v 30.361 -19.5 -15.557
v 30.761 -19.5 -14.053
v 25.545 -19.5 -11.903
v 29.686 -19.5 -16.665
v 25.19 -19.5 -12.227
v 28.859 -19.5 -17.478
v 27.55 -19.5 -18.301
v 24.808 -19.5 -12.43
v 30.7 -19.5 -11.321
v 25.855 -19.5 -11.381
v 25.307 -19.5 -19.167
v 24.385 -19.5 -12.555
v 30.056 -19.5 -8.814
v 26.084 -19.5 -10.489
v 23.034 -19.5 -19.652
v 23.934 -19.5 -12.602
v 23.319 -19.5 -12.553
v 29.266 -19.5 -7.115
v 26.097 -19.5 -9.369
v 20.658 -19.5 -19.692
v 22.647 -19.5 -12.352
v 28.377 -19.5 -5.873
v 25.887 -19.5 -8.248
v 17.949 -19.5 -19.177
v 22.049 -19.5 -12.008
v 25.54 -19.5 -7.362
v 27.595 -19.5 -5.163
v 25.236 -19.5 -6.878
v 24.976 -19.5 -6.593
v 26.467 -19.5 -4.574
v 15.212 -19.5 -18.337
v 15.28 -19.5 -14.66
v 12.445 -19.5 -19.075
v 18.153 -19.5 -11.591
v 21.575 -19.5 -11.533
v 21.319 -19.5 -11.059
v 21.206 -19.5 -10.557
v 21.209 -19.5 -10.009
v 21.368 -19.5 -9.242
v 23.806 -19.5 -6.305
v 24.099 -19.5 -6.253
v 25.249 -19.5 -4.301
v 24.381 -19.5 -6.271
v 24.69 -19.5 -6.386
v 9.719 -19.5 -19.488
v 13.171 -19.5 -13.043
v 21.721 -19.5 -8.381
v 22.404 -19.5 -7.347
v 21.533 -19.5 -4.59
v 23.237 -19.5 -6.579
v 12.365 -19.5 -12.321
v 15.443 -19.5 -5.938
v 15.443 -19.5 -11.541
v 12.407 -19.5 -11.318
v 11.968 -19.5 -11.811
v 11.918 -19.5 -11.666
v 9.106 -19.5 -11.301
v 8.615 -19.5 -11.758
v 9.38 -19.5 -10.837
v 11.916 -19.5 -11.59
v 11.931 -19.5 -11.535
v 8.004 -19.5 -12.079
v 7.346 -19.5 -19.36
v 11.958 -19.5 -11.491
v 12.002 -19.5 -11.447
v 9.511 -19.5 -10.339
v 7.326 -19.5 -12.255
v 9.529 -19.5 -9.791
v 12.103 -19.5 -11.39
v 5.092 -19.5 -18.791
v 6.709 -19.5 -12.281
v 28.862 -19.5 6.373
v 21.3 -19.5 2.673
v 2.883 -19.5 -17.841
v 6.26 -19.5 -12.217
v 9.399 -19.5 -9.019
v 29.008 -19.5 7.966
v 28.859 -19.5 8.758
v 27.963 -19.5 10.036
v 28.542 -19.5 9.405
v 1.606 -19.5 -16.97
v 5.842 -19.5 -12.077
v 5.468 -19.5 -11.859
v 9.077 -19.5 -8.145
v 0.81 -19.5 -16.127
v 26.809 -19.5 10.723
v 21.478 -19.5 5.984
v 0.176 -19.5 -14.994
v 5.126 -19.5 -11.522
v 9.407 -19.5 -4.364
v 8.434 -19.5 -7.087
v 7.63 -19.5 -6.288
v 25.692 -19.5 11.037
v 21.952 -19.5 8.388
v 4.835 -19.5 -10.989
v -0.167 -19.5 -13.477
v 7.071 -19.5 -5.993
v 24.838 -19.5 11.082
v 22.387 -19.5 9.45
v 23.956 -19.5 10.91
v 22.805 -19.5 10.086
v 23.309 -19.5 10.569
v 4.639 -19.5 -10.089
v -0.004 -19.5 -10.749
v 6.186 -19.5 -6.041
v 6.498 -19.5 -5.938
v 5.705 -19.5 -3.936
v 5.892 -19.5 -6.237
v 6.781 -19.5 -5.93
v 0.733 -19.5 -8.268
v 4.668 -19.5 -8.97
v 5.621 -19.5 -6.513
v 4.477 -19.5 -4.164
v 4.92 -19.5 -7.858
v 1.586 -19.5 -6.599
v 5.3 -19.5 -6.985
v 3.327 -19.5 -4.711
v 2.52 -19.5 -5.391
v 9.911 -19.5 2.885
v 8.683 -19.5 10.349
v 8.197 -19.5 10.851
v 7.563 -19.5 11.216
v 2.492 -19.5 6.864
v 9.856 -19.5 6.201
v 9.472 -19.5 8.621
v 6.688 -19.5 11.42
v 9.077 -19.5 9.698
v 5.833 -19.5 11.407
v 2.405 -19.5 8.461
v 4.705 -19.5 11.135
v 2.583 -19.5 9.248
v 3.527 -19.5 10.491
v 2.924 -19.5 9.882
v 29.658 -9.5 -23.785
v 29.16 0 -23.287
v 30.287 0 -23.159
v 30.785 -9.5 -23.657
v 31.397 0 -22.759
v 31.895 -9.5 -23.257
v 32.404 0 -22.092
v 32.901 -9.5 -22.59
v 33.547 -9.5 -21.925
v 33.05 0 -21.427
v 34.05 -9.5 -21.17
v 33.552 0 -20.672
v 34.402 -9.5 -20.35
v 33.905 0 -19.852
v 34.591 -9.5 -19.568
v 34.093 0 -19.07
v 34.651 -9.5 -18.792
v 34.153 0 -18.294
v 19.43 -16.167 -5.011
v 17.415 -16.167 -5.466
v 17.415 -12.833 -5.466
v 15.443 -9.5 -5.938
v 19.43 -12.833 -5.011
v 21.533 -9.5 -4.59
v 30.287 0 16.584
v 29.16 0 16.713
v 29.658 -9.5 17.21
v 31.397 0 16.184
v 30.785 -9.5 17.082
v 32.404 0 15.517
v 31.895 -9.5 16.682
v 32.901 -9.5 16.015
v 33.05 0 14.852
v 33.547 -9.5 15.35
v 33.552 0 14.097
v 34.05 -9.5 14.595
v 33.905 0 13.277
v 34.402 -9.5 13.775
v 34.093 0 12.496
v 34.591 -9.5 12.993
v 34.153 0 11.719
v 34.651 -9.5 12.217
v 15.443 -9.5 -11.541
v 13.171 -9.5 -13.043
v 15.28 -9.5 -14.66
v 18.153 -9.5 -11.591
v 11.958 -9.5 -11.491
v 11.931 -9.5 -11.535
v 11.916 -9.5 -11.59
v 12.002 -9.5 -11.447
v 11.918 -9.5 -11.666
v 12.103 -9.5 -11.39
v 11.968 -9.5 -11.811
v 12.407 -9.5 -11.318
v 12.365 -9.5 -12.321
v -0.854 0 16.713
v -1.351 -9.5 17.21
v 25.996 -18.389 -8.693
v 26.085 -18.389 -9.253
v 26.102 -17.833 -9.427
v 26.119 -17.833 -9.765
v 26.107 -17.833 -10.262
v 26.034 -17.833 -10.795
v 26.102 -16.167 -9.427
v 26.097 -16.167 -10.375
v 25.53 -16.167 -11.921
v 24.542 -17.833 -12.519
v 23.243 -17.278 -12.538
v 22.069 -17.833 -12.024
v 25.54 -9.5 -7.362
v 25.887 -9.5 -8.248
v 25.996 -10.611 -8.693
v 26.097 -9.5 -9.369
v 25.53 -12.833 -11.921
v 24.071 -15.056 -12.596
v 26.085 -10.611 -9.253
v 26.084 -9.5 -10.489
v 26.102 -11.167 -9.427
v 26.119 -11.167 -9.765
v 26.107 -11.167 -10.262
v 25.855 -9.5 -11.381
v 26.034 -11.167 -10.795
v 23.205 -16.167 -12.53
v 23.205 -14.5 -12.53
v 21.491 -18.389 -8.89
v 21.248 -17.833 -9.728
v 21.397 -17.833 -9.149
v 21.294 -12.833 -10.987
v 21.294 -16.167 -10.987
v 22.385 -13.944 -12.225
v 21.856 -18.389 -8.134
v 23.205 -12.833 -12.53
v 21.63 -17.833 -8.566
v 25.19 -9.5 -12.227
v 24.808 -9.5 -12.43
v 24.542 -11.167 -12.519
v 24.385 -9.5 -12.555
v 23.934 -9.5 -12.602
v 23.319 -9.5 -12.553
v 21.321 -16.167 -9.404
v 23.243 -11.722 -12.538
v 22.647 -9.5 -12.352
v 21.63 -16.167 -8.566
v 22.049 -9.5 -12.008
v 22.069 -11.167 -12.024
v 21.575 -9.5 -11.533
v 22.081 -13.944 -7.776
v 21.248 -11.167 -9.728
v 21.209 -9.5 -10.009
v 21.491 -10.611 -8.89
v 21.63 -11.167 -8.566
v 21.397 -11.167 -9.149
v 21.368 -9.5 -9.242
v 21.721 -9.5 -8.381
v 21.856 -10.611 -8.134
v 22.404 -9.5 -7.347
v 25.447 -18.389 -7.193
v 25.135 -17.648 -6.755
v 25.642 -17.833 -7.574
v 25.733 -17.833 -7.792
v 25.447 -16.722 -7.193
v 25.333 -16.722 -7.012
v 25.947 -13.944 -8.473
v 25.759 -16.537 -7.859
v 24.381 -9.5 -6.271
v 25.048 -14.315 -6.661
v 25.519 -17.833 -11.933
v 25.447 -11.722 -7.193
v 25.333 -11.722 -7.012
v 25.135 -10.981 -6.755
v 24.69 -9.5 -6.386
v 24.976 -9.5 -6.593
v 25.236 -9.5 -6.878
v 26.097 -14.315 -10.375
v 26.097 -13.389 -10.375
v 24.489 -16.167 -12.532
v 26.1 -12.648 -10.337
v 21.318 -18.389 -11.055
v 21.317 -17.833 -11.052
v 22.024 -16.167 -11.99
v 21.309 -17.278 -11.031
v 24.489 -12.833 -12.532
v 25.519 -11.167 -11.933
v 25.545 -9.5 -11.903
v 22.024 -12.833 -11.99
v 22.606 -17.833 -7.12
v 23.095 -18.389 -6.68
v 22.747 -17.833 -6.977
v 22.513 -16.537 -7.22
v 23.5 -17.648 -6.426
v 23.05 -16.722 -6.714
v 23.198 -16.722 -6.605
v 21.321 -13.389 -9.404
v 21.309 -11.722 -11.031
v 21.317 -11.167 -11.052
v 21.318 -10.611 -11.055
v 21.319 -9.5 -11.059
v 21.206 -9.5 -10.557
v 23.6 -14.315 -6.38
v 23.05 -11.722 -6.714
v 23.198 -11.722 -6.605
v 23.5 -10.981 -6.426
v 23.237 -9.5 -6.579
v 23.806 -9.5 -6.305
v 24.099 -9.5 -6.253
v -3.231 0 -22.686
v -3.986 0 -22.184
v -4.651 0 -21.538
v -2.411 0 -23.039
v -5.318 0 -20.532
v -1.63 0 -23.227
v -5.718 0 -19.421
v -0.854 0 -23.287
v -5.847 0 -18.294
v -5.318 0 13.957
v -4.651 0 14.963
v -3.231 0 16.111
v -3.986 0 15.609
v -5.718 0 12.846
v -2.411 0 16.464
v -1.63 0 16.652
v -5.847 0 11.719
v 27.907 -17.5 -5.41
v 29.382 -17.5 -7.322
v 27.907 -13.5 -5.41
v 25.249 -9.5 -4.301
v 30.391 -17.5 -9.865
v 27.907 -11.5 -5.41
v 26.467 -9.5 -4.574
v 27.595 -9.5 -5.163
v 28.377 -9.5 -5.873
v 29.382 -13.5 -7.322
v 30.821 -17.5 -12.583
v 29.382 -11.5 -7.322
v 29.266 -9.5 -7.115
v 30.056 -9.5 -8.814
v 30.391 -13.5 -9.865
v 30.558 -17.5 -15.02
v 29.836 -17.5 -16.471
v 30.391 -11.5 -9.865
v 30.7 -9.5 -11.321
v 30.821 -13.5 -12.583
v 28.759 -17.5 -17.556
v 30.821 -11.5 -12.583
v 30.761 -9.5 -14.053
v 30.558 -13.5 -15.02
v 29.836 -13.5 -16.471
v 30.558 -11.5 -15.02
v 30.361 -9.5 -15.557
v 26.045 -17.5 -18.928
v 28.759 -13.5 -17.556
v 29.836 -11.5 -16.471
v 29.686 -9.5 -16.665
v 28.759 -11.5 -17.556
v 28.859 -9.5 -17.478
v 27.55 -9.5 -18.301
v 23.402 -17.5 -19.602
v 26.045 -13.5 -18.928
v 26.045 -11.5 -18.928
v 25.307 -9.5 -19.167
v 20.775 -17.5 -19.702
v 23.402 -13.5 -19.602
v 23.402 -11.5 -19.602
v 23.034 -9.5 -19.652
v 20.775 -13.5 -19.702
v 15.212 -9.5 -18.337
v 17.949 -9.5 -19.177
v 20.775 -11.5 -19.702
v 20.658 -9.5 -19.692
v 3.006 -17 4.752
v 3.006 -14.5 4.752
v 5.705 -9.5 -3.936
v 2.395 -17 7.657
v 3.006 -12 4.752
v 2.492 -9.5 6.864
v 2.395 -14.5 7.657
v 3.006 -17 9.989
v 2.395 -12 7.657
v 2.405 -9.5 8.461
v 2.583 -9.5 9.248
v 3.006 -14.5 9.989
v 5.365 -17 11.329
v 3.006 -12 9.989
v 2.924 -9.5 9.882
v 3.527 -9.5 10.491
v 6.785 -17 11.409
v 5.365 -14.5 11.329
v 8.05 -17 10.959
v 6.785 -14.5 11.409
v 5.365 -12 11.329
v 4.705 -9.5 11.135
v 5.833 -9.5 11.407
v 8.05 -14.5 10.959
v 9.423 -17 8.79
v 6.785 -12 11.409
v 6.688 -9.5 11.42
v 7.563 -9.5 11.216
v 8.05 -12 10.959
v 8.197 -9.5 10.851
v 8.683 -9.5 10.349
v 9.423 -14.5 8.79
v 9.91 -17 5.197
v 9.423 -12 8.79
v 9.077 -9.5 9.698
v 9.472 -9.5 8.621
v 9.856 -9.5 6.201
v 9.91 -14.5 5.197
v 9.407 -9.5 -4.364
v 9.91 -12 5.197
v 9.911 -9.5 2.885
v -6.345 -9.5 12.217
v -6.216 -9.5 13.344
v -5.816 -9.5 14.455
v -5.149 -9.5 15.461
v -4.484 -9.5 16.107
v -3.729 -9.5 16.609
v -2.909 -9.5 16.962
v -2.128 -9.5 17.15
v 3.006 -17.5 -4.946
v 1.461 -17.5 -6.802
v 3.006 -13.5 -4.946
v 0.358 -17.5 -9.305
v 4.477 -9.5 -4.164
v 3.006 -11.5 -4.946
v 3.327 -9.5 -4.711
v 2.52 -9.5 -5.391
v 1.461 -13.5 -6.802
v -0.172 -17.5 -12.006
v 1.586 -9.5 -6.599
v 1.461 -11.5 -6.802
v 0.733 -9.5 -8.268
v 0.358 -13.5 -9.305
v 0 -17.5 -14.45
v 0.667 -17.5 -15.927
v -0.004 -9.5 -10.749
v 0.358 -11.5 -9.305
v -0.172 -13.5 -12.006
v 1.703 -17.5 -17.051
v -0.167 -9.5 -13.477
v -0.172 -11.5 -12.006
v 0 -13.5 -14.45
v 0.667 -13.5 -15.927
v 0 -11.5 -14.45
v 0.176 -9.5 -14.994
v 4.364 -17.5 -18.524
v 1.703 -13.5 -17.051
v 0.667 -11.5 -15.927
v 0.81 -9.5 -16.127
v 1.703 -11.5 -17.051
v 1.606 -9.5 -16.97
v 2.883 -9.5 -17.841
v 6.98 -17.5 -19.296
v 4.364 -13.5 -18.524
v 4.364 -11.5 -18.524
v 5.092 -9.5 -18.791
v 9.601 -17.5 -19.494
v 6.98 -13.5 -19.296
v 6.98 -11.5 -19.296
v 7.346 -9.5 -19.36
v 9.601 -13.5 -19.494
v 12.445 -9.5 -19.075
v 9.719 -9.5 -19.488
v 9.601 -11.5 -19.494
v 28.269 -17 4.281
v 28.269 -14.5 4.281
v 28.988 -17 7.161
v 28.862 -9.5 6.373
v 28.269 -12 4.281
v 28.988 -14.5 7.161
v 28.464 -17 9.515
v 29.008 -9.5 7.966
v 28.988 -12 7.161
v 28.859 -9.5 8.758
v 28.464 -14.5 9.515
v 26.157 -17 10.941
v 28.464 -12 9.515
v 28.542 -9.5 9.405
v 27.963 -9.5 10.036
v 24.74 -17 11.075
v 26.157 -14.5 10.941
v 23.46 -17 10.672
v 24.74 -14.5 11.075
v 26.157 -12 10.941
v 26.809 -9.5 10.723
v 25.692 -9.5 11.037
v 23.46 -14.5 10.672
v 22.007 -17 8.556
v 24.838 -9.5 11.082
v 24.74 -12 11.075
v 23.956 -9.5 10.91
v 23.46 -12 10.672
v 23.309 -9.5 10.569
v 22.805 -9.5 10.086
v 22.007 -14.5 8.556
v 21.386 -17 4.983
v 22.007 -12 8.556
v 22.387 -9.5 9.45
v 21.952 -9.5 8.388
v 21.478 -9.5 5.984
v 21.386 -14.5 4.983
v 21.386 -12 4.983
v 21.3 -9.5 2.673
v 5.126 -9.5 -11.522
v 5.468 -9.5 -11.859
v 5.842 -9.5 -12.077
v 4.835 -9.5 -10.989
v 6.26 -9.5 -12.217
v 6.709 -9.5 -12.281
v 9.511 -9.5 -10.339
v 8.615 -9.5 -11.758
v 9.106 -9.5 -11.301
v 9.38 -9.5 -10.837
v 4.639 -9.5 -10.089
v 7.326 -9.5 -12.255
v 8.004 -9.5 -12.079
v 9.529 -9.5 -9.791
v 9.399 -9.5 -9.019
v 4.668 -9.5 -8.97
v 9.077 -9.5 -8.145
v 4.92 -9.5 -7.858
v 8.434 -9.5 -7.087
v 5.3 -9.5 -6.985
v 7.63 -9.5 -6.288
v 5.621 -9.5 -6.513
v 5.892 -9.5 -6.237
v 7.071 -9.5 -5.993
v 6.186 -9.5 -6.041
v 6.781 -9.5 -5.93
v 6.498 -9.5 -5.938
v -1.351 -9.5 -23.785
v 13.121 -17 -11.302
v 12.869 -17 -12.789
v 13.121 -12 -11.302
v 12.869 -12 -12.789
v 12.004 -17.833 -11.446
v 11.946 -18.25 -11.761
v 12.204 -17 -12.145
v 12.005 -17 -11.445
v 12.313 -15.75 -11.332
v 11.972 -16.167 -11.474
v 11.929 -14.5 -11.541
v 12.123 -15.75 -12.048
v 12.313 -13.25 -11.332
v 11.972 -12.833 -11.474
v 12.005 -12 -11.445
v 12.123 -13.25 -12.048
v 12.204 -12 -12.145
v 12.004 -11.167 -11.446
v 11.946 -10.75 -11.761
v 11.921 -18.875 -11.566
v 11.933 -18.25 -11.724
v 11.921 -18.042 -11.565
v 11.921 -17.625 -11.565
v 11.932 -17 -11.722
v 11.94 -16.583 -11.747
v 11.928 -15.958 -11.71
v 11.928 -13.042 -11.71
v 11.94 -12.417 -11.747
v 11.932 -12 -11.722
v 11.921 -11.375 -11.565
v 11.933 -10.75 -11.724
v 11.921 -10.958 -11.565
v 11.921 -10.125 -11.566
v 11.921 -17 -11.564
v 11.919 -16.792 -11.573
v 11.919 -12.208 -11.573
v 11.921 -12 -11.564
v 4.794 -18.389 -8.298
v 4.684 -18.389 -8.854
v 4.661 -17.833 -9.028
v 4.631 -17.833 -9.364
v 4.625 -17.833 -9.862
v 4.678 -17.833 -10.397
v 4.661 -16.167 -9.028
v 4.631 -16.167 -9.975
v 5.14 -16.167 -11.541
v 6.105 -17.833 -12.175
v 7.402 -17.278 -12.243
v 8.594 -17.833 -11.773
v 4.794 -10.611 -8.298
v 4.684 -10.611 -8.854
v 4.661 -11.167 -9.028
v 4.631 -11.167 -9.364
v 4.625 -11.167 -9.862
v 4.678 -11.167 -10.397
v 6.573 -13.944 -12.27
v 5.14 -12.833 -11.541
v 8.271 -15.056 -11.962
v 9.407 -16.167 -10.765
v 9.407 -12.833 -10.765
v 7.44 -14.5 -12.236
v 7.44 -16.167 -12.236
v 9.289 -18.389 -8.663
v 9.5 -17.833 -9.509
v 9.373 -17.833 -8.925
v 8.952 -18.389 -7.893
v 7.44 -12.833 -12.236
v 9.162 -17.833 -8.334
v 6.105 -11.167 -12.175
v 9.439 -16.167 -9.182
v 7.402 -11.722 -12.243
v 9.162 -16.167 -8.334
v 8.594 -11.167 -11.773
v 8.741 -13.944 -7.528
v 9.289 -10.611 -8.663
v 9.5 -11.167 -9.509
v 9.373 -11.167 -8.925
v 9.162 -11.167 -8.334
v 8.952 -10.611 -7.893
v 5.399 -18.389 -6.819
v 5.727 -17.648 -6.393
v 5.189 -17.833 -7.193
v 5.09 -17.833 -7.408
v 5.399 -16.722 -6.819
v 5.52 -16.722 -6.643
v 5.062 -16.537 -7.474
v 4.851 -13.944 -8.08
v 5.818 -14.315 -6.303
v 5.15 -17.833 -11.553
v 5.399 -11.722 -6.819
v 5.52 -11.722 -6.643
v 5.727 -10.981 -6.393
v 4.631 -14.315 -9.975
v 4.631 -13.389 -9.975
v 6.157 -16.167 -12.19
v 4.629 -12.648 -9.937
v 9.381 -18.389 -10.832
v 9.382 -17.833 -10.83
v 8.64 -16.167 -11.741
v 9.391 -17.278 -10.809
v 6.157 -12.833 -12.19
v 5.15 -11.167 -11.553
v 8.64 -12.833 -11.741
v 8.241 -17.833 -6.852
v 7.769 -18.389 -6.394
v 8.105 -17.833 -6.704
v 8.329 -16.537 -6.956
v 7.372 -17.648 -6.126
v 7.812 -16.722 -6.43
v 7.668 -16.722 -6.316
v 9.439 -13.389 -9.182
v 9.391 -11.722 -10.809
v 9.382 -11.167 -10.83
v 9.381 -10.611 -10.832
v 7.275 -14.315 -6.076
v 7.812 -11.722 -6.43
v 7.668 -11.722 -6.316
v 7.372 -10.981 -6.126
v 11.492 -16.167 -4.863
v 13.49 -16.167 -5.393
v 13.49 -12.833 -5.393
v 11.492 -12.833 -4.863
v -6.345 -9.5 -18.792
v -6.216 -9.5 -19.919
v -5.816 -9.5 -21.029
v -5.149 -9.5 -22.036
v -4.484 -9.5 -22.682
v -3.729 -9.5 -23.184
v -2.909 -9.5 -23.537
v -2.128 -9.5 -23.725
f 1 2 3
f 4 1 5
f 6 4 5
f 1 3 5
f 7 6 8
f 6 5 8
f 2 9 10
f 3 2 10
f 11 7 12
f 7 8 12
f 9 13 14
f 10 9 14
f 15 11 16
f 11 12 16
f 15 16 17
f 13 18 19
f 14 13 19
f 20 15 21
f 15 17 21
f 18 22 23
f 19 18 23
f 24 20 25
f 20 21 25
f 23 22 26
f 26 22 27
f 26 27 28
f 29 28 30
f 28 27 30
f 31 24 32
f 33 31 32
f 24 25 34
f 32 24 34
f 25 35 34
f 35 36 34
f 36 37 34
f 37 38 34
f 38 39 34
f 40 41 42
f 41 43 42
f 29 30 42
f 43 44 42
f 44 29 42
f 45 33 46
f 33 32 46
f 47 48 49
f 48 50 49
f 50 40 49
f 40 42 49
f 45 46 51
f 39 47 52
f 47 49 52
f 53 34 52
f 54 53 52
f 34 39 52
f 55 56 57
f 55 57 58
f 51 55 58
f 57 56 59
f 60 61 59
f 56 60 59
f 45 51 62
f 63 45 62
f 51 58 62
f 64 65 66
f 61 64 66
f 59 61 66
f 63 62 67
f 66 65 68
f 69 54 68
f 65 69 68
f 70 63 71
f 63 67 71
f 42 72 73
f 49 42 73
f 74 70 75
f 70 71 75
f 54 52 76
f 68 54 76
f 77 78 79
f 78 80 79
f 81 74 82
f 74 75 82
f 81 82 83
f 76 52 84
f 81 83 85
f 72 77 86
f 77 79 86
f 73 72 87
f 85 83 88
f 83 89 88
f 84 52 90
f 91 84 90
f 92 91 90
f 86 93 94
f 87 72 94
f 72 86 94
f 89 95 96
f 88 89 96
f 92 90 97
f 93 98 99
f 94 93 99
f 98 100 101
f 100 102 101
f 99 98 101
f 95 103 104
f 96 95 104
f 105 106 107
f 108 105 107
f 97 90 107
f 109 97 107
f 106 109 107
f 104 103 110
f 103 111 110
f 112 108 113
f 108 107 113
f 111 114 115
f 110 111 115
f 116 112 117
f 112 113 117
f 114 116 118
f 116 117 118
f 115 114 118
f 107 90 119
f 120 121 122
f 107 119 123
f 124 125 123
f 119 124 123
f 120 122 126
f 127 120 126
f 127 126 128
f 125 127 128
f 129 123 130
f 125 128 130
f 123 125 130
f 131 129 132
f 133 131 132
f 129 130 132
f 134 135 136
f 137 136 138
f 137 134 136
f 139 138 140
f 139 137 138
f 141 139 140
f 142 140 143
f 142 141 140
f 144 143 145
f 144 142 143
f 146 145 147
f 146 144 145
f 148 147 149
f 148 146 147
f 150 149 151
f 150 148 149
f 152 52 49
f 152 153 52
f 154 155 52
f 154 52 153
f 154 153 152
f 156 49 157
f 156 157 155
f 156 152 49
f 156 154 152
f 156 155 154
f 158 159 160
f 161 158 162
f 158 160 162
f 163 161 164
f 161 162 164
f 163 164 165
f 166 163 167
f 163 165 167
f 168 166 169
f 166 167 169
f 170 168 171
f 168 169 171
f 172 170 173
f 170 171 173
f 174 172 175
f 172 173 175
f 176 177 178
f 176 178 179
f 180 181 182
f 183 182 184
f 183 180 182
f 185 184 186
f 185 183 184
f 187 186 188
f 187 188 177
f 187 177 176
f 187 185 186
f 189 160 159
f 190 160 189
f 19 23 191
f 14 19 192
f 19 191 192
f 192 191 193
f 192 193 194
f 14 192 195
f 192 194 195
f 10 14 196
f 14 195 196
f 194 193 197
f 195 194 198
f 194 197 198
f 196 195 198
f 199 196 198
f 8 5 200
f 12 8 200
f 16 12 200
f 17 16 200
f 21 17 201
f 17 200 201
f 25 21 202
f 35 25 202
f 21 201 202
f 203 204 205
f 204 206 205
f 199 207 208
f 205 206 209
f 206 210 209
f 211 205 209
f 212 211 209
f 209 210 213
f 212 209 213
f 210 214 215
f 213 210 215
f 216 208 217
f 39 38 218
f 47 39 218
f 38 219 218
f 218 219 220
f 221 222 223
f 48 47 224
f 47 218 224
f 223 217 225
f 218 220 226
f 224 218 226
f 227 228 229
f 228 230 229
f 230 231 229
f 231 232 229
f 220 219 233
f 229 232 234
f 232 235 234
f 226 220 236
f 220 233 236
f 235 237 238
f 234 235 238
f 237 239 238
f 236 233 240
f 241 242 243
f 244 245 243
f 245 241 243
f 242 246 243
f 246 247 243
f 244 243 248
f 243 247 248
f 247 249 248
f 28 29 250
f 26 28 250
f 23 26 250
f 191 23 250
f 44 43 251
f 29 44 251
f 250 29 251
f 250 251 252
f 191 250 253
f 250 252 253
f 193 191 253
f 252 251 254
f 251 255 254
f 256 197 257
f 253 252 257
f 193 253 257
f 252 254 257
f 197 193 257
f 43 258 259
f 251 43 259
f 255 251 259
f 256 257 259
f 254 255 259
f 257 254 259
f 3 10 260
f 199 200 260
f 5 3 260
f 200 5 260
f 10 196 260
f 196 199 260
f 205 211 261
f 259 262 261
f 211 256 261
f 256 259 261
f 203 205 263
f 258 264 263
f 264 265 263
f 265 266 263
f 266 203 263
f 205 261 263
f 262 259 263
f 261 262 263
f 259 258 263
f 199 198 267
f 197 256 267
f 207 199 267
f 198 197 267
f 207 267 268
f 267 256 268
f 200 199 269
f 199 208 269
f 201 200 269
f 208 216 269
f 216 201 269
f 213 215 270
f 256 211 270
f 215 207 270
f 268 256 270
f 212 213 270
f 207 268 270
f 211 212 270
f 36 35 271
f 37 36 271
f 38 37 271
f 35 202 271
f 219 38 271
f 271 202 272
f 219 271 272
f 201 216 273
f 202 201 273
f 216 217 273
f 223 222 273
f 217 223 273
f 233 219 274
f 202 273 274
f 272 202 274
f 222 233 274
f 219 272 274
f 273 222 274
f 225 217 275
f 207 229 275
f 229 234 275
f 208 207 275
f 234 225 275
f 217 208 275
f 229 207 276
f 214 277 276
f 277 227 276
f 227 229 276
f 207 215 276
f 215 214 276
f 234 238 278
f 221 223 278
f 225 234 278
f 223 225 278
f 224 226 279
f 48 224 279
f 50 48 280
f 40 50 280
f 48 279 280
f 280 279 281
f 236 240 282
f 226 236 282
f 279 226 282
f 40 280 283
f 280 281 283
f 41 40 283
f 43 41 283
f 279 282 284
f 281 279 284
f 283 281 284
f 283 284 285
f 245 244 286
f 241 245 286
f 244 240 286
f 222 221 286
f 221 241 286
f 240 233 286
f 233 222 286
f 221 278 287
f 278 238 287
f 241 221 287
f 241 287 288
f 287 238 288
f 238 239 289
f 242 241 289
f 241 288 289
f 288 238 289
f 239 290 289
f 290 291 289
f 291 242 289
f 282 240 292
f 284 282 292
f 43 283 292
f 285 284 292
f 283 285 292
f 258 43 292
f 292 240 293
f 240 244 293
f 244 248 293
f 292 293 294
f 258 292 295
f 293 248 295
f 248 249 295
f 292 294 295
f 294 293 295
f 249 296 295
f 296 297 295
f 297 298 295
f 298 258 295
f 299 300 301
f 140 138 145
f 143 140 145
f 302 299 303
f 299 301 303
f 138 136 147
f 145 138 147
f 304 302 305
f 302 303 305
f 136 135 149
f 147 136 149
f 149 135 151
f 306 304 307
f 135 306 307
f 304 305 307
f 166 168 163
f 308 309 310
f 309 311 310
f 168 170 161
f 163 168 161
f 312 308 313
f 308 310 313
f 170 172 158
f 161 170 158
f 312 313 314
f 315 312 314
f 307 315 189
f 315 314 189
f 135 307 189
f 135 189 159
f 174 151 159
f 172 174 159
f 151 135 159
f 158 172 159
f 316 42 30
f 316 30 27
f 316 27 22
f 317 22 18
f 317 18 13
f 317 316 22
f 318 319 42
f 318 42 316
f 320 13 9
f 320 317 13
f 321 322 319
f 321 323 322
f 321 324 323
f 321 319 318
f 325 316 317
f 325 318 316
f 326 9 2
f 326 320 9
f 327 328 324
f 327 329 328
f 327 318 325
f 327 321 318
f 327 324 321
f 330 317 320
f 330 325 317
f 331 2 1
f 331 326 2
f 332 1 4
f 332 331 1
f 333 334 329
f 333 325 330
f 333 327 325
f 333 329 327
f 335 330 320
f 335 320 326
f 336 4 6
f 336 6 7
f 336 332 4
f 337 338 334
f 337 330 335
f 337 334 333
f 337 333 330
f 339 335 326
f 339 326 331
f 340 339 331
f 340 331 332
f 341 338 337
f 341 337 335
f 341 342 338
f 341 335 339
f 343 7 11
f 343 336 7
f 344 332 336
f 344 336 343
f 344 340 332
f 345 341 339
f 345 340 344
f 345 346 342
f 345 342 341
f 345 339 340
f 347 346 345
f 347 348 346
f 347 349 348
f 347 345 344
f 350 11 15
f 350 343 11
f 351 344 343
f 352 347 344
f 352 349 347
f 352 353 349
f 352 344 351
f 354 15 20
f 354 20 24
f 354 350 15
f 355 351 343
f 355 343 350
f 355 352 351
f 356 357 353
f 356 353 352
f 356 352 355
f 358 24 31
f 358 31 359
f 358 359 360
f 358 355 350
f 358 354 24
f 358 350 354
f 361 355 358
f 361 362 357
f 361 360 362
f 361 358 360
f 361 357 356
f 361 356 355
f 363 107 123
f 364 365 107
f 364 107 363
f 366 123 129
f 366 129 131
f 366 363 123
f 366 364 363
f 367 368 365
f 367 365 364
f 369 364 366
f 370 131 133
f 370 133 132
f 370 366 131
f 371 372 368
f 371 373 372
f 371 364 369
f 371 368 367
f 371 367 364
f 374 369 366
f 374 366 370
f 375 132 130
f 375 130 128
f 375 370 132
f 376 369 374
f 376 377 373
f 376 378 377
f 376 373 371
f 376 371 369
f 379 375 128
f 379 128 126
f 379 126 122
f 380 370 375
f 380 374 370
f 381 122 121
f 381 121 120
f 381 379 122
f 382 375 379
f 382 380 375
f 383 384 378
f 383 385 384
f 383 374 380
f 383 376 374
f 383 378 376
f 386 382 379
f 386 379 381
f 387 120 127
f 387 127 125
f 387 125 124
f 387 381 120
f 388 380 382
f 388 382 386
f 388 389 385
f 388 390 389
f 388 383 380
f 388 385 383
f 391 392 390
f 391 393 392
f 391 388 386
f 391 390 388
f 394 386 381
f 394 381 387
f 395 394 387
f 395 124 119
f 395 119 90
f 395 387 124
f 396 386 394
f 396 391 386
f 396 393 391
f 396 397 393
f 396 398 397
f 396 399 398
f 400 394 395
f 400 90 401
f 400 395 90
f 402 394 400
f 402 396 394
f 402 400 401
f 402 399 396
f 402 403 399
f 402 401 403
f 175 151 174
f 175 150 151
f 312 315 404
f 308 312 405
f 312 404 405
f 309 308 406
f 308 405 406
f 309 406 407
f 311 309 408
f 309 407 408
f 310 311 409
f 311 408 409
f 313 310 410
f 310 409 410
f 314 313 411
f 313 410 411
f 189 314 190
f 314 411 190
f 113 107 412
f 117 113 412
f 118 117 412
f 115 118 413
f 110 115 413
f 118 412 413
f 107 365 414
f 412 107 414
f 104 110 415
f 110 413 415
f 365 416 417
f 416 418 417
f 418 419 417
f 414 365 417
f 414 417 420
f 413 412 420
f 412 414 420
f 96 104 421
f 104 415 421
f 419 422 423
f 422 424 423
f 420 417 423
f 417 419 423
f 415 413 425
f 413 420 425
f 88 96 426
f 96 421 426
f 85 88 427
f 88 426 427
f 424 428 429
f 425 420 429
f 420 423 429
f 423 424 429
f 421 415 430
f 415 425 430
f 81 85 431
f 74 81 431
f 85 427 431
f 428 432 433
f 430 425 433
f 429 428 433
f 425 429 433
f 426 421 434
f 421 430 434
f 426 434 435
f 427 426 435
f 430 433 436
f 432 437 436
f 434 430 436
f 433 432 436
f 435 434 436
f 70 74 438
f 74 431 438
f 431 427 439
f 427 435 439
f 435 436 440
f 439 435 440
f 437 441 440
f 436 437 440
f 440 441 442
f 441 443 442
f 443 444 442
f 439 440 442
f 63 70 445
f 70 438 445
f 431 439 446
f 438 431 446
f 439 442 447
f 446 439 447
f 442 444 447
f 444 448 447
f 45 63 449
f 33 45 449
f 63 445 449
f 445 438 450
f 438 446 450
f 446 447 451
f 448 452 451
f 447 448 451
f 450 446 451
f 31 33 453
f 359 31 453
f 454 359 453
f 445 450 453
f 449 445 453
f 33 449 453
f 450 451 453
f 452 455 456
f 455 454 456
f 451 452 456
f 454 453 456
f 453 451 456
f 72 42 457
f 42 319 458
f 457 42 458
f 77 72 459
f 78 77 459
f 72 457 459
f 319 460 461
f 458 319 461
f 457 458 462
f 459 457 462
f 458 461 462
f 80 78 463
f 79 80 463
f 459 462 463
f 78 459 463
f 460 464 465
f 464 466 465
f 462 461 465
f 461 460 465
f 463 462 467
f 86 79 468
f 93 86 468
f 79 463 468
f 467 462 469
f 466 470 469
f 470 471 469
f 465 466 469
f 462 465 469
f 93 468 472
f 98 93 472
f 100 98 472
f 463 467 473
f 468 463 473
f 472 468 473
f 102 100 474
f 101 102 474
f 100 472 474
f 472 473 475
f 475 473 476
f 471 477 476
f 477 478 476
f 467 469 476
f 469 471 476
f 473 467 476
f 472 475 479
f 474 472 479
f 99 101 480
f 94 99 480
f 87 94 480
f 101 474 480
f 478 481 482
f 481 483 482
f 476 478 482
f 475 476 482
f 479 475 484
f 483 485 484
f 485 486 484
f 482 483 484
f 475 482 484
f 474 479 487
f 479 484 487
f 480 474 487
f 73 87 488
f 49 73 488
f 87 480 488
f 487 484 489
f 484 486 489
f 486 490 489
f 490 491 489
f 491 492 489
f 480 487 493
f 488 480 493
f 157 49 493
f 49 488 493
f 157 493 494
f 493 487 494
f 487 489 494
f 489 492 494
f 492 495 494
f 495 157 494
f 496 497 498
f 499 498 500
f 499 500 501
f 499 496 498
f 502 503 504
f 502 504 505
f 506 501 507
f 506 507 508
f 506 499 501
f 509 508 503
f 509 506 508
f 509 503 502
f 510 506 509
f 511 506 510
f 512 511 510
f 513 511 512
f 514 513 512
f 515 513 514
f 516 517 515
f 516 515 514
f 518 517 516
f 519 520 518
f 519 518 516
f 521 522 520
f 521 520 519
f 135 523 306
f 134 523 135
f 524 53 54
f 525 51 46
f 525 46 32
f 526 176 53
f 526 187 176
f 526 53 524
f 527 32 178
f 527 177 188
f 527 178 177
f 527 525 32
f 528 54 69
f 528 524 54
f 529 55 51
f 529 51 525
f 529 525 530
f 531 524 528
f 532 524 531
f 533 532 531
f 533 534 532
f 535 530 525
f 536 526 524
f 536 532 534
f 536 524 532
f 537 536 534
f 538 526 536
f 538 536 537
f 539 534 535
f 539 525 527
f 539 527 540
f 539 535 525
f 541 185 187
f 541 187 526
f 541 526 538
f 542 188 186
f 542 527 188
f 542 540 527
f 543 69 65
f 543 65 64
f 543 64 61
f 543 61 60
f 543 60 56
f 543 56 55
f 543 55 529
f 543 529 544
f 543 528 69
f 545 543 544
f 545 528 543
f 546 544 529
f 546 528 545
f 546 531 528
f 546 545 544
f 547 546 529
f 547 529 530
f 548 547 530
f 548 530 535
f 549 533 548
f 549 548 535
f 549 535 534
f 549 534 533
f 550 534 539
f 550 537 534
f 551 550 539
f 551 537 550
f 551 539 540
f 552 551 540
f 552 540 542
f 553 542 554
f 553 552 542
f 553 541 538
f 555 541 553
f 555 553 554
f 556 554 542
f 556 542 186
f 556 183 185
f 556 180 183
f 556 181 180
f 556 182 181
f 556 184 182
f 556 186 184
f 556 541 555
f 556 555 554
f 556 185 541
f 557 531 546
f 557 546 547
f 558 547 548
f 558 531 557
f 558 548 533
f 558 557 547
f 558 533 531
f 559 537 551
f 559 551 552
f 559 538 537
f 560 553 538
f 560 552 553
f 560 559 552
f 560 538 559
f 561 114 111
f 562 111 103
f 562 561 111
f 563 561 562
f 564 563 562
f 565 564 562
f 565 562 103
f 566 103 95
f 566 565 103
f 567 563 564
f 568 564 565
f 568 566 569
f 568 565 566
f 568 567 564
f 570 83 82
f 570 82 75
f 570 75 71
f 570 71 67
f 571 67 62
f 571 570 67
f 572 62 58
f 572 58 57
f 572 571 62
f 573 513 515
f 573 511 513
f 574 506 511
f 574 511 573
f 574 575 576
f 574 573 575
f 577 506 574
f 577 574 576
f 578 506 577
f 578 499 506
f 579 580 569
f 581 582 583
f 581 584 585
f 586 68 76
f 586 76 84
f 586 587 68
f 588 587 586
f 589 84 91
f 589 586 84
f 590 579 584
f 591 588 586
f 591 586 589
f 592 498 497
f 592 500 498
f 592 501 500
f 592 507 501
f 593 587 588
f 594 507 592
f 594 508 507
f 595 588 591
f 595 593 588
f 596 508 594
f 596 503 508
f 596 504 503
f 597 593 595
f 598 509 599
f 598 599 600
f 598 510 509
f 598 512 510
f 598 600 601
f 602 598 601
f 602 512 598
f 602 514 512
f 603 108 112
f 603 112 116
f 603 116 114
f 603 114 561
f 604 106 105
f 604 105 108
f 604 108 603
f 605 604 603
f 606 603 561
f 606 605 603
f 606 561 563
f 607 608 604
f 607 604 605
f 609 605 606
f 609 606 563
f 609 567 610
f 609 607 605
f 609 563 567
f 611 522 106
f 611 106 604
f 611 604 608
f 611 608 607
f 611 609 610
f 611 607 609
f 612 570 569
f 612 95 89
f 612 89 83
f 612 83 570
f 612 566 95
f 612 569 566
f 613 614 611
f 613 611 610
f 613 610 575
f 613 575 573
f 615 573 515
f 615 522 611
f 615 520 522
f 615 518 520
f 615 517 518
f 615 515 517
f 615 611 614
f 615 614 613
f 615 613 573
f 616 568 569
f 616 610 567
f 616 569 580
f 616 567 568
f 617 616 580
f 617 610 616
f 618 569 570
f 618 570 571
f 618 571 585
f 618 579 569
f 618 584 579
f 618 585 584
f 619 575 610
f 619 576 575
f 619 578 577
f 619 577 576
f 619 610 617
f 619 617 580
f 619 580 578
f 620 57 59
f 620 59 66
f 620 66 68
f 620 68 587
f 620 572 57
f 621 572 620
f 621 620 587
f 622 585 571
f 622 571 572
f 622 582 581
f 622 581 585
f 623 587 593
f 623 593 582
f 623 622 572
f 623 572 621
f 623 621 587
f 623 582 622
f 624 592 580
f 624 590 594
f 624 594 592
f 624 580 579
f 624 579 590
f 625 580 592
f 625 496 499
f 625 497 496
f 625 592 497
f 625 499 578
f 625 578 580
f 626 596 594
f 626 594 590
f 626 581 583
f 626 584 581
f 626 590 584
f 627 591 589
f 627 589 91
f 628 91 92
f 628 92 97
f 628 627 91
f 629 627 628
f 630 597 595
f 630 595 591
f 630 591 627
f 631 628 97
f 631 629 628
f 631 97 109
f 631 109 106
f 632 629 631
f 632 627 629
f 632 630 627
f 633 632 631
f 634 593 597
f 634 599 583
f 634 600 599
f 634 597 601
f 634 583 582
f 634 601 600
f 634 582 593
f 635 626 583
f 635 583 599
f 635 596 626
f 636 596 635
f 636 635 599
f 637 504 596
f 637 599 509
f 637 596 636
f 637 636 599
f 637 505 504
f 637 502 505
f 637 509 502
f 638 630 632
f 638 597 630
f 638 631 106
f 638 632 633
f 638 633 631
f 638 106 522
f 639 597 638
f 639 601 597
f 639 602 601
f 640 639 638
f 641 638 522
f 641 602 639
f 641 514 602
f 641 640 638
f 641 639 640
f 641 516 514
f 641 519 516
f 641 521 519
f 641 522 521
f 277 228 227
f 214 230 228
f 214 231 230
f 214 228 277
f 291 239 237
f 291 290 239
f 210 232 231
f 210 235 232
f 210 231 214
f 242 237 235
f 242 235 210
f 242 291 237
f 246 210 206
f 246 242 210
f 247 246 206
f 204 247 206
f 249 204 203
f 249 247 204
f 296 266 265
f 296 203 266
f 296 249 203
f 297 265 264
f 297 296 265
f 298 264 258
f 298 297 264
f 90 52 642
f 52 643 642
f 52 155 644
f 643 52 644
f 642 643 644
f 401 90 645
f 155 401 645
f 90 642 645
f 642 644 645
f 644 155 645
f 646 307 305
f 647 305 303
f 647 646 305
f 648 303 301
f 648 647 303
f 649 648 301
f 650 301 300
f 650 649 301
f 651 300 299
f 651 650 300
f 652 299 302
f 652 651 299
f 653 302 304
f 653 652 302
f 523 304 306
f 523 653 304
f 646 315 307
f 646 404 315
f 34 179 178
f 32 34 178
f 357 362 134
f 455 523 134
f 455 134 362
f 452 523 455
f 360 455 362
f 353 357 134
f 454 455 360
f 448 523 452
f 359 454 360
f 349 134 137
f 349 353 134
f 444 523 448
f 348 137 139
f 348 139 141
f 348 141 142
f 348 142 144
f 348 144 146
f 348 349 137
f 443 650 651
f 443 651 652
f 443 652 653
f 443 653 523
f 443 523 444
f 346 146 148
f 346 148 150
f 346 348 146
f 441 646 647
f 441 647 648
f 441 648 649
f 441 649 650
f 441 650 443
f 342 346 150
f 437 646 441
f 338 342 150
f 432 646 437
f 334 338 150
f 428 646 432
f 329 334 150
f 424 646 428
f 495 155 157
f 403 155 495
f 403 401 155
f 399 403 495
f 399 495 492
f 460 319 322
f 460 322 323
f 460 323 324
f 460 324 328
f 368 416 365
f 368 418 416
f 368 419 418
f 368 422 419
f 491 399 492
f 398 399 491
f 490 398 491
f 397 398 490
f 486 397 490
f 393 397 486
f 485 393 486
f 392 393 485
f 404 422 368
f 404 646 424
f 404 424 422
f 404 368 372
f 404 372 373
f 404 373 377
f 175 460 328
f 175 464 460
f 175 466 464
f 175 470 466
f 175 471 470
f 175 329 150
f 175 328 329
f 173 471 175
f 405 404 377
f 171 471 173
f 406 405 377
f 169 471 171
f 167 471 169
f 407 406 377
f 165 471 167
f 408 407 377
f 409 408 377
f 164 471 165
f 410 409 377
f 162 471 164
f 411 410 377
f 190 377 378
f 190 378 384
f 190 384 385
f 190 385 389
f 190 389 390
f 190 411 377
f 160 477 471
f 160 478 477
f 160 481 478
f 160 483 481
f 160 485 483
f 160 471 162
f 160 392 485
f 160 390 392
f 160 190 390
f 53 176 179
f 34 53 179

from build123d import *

# Parameters (mm, degrees)
F0_W     = 40
F0_H     = 40
F1_DEPTH = 9.5
F1_TAPER = -3
F3_DEPTH = 10
F4_R     = 5


with BuildPart() as f1:
    # F0 (on Front) → F1 (new body)
    with BuildSketch(Plane.XZ):
        with Locations((14.15322721, -3.2874327707)):
            Rectangle(F0_W, F0_H)
    extrude(amount=F1_DEPTH, taper=F1_TAPER)

    # F2 (on face) → F3 (join)
    with BuildSketch(Plane.XZ.offset(9.5)):
        with BuildLine():
            add(Edge.make_bspline(
                [(15.4427378055, -5.9380531249), (17.4076100785, -5.4627778585), (19.3724823516, -4.9875025921), (21.532589289, -4.5901611645)],
                knots=[0, 0, 0, 0, 0.1628644785, 0.1628644785, 0.1628644785, 0.1628644785], degree=3))
            add(Edge.make_bspline(
                [(15.4427378055, -5.9380531249), (13.496935518, -5.3899079926), (11.5511332305, -4.8417628604), (9.4073284417, -4.3642241508)],
                knots=[0, 0, 0, 0, 0.1628644785, 0.1628644785, 0.1628644785, 0.1628644785], degree=3))
            add(Edge.make_bspline(
                [(9.4073284417, -4.3642241508), (8.1937678427, -4.0939000217), (6.9167584838, -3.8462013136), (5.7046060089, -3.9363729443)],
                knots=[0.1628644785, 0.1628644785, 0.1628644785, 0.1628644785, 0.255058467, 0.255058467, 0.255058467, 0.255058467], degree=3))
            add(Edge.make_bspline(
                [(5.7046060089, -3.9363729443), (4.7430674137, -4.0079014895), (1.2301656717, -5.0919629627), (-1.8907689465, -15.255745714), (4.3114213843, -18.83853525), (9.6106669115, -19.9361347211), (13.3221727046, -18.8762759486), (15.2117066308, -18.3367000407)],
                knots=[0.255058467, 0.255058467, 0.255058467, 0.255058467, 0.3281912453, 0.5340858443, 0.6934199544, 0.8439195762, 1, 1, 1, 1], degree=3))
            add(Edge.make_bspline(
                [(25.2486806324, -4.3005490154), (26.2068870067, -4.4078492813), (29.676964295, -5.6220286504), (32.4170885825, -15.8950239096), (26.0857296406, -19.2442685571), (20.7492725245, -20.1436868159), (17.0798273993, -18.9462945066), (15.2117066308, -18.3367000407)],
                knots=[0.255058467, 0.255058467, 0.255058467, 0.255058467, 0.3281912453, 0.5340858443, 0.6934199544, 0.8439195762, 1, 1, 1, 1], degree=3))
            add(Edge.make_bspline(
                [(21.532589289, -4.5901611645), (22.7553781748, -4.3652349475), (24.0407288831, -4.1652821799), (25.2486806324, -4.3005490154)],
                knots=[0.1628644785, 0.1628644785, 0.1628644785, 0.1628644785, 0.255058467, 0.255058467, 0.255058467, 0.255058467], degree=3))
        make_face()
        with BuildLine():
            add(Edge.make_bspline(
                [(15.4427378055, -11.5409493446), (13.7694562977, -11.3282843825), (10.1862339635, -10.8728763483), (13.5090703004, -13.343147403), (15.2802193352, -14.6598593174)],
                knots=[0, 0, 0, 0, 0.4669767466, 1, 1, 1, 1], degree=3))
            Line((15.4427378055, -11.5409493446), (18.1529070965, -11.5914495))
            Line((18.1529070965, -11.5914495), (15.2802193352, -14.6598593174))
        make_face(mode=Mode.SUBTRACT)
        with BuildLine():
            add(Edge.make_bspline(
                [(6.497845985, -5.9380531249), (4.9591381281, -6.1938031511), (3.0926448712, -13.3888531992), (11.8647773781, -11.8123598553), (8.0192428058, -5.6851803817), (6.497845985, -5.9380531249)],
                knots=[0, 0, 0, 0, 0.3501257858, 0.6538132596, 1, 1, 1, 1], degree=3))
        make_face(mode=Mode.SUBTRACT)
        with BuildLine():
            add(Edge.make_bspline(
                [(24.381420265, -6.2712881306), (25.9095322135, -6.5841839879), (27.5066837811, -13.8437741377), (18.7993717458, -11.9415761718), (22.8705001447, -5.9619124681), (24.381420265, -6.2712881306)],
                knots=[0, 0, 0, 0, 0.3501257858, 0.6538132596, 1, 1, 1, 1], degree=3))
        make_face(mode=Mode.SUBTRACT)
        with BuildLine():
            add(Edge.make_bspline(
                [(9.4073284417, -4.3642241508), (8.1937678427, -4.0939000217), (6.9167584838, -3.8462013136), (5.7046060089, -3.9363729443)],
                knots=[0.1628644785, 0.1628644785, 0.1628644785, 0.1628644785, 0.255058467, 0.255058467, 0.255058467, 0.255058467], degree=3))
            add(Edge.make_bspline(
                [(5.7046060089, -3.9363729443), (4.7391447852, -0.9450299226), (3.0410334804, 4.3132933346), (1.4933527853, 10.5705908358), (10.9490352093, 13.1548066897), (10.0054336437, 2.4322746557), (9.4073284417, -4.3642241508)],
                knots=[0, 0, 0, 0, 0.2624421968, 0.4615594882, 0.658736598, 1, 1, 1, 1], degree=3))
        make_face()
        with BuildLine():
            add(Edge.make_bspline(
                [(25.2486806324, -4.3005490154), (26.3249118164, -1.3472500317), (28.2177390808, 3.8441611857), (29.9974561718, 10.0394573552), (20.6446106461, 12.9741434126), (21.1880975701, 2.2239015968), (21.532589289, -4.5901611645)],
                knots=[0, 0, 0, 0, 0.2624421968, 0.4615594882, 0.658736598, 1, 1, 1, 1], degree=3))
            add(Edge.make_bspline(
                [(21.532589289, -4.5901611645), (22.7553781748, -4.3652349475), (24.0407288831, -4.1652821799), (25.2486806324, -4.3005490154)],
                knots=[0.1628644785, 0.1628644785, 0.1628644785, 0.1628644785, 0.255058467, 0.255058467, 0.255058467, 0.255058467], degree=3))
        make_face()
    extrude(amount=F3_DEPTH)

    # F4
    f4_edges = [f1.edges().sort_by_distance(p)[0] for p in [
        (-6.09571, -4.75, 16.961504),
        (34.402164, -4.75, 16.961504),
        (34.402164, -4.75, -23.53637),
        (-6.09571, -4.75, -23.53637),
    ]]
    fillet(f4_edges, radius=F4_R)


solid = f1.part
